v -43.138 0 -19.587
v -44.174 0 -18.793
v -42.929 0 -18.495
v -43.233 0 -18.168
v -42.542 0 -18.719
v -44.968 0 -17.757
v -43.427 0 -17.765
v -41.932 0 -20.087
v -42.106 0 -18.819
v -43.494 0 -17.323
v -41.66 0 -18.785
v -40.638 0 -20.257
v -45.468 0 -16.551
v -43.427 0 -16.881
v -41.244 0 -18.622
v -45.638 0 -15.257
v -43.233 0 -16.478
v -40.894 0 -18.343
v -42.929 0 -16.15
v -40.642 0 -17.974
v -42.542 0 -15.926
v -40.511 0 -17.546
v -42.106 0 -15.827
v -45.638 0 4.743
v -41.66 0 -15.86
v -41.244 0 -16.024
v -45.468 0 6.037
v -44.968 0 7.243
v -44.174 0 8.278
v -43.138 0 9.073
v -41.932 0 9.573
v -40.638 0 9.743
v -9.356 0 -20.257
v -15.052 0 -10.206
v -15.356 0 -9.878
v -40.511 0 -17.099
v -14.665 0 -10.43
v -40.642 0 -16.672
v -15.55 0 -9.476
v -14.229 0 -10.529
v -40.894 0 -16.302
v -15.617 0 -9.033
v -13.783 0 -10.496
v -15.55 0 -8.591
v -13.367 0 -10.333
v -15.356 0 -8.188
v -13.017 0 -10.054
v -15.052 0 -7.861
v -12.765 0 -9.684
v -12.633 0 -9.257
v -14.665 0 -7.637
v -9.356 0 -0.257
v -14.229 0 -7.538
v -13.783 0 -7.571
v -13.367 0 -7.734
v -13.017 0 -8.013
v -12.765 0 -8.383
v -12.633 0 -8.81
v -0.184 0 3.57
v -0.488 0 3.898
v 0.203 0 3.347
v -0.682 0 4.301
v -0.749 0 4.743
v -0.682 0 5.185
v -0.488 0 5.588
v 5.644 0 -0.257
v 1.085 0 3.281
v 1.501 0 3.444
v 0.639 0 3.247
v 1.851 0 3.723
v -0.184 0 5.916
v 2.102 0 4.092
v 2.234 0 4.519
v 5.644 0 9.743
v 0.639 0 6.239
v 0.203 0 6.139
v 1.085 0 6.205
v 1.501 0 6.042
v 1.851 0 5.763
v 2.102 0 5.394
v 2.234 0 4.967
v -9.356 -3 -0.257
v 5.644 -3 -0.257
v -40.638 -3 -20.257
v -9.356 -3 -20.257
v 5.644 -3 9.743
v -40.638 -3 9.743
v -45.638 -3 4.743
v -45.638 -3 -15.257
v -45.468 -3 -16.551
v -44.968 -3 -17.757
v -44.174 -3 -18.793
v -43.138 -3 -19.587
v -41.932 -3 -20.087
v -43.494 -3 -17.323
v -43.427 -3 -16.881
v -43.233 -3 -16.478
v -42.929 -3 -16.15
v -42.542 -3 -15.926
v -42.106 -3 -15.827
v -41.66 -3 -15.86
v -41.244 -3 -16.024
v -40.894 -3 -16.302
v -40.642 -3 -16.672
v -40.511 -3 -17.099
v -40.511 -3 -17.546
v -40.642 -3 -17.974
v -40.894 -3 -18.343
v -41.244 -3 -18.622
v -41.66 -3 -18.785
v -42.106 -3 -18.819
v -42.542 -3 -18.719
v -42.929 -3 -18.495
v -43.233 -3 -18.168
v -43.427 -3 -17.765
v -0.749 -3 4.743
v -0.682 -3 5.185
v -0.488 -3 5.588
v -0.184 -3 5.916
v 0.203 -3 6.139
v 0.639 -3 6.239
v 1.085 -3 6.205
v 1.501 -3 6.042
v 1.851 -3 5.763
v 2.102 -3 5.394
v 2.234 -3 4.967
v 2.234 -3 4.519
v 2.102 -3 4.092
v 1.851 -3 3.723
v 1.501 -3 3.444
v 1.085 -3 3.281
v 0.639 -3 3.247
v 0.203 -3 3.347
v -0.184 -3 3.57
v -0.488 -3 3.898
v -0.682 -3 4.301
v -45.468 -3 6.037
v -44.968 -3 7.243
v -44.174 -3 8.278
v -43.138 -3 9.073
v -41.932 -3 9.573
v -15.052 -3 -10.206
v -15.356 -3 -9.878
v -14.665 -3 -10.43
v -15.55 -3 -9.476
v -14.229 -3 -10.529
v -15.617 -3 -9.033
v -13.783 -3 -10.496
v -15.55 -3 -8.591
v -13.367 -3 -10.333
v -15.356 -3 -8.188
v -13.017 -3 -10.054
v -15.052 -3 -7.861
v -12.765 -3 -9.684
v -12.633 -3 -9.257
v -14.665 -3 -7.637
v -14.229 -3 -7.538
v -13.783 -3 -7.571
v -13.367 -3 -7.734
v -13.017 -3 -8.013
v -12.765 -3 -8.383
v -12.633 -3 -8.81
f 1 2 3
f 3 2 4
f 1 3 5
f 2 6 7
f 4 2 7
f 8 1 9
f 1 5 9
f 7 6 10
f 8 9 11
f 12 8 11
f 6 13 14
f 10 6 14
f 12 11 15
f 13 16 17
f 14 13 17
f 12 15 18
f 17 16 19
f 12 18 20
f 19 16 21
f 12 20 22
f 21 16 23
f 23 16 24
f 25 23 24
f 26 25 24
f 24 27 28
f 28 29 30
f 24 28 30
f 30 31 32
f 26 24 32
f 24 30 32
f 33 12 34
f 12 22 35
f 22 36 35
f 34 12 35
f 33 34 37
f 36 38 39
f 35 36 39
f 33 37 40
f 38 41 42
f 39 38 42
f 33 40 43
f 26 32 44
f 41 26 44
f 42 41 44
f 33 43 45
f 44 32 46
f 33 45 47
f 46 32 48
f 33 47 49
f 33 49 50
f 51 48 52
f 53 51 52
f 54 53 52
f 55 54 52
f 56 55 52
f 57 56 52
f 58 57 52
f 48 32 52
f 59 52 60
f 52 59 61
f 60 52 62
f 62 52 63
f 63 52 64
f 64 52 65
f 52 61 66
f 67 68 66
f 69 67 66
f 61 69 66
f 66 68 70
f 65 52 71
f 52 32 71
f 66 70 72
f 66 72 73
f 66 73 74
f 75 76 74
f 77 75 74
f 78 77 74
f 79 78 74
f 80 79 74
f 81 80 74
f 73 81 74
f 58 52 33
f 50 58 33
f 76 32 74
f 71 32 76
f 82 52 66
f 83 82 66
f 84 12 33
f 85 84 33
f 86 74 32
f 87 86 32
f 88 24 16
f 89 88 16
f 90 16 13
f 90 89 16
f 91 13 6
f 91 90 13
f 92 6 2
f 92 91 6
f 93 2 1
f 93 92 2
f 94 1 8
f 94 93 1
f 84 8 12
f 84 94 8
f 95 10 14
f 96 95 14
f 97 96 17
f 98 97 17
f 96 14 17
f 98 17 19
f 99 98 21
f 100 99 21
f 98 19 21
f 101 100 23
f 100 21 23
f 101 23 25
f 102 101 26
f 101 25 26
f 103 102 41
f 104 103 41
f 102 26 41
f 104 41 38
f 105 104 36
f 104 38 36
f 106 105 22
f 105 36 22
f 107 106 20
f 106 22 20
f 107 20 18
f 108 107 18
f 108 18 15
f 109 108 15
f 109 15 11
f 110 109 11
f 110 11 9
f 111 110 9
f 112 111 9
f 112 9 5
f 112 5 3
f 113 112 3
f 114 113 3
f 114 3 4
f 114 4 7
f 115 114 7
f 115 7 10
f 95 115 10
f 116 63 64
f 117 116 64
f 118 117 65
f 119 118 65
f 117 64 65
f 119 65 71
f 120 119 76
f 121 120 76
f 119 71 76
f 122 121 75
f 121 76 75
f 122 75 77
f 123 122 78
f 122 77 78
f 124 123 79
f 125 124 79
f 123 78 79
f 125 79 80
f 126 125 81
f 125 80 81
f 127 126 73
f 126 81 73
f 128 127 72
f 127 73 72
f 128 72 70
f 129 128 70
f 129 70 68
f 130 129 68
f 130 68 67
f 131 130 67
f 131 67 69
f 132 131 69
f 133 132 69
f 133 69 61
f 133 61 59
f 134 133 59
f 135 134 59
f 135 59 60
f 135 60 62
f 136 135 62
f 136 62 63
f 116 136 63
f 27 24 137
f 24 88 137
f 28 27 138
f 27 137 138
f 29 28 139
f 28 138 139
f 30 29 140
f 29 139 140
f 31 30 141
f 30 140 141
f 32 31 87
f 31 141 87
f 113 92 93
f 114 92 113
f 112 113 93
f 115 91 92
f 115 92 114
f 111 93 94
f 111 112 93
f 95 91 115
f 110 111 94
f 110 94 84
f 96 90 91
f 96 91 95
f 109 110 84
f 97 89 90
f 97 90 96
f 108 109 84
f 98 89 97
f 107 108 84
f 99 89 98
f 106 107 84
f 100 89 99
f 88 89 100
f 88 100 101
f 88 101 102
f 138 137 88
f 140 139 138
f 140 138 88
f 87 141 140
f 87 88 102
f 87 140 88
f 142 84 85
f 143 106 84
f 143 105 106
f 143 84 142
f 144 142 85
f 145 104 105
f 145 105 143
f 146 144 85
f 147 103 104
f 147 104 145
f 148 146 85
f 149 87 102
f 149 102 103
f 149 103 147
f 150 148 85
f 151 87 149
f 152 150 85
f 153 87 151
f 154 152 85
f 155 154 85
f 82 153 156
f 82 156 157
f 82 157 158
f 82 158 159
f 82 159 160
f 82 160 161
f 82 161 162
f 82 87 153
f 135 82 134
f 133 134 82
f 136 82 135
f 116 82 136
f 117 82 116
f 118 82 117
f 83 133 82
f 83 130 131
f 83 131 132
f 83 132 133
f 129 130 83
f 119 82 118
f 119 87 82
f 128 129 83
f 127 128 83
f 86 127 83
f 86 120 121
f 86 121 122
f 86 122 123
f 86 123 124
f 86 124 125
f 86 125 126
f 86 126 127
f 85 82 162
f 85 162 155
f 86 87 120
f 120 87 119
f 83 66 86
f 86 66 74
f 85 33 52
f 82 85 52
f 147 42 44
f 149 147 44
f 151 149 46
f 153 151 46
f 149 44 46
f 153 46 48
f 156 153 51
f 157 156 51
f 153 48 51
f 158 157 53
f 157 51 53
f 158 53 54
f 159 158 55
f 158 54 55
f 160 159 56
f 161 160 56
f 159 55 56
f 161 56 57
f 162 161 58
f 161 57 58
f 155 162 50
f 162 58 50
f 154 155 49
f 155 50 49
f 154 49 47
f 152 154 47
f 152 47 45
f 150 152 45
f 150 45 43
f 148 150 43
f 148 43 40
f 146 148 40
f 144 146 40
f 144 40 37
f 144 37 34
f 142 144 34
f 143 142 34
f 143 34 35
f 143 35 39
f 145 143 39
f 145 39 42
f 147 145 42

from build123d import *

# Parameters (mm, degrees)
F1_DEPTH = 3
F3_D     = 3
F4_R     = 5


with BuildPart() as f1:
    # F0 (on Front) → F1 (new body)
    with BuildSketch(Plane.XZ):
        Polygon((-45.63814, 9.742956), (-45.63814, -20.257044), (-9.356174, -20.257044), (-9.356174, -0.257044), (5.643826, -0.257044), (5.643826, 9.742956), align=None)
    extrude(amount=F1_DEPTH)

    # F3 (through all)
    with Locations(Plane.XZ.offset(3)):
        with Locations((-41.993771, -17.322723), (-14.116627, -9.033464), (0.750969, 4.742956)):
            Hole(F3_D / 2)

    # F4
    f4_edges = [f1.edges().sort_by_distance(p)[0] for p in [
        (-45.63814, -1.5, 9.742956),
        (-45.63814, -1.5, -20.257044),
    ]]
    fillet(f4_edges, radius=F4_R)


solid = f1.part
